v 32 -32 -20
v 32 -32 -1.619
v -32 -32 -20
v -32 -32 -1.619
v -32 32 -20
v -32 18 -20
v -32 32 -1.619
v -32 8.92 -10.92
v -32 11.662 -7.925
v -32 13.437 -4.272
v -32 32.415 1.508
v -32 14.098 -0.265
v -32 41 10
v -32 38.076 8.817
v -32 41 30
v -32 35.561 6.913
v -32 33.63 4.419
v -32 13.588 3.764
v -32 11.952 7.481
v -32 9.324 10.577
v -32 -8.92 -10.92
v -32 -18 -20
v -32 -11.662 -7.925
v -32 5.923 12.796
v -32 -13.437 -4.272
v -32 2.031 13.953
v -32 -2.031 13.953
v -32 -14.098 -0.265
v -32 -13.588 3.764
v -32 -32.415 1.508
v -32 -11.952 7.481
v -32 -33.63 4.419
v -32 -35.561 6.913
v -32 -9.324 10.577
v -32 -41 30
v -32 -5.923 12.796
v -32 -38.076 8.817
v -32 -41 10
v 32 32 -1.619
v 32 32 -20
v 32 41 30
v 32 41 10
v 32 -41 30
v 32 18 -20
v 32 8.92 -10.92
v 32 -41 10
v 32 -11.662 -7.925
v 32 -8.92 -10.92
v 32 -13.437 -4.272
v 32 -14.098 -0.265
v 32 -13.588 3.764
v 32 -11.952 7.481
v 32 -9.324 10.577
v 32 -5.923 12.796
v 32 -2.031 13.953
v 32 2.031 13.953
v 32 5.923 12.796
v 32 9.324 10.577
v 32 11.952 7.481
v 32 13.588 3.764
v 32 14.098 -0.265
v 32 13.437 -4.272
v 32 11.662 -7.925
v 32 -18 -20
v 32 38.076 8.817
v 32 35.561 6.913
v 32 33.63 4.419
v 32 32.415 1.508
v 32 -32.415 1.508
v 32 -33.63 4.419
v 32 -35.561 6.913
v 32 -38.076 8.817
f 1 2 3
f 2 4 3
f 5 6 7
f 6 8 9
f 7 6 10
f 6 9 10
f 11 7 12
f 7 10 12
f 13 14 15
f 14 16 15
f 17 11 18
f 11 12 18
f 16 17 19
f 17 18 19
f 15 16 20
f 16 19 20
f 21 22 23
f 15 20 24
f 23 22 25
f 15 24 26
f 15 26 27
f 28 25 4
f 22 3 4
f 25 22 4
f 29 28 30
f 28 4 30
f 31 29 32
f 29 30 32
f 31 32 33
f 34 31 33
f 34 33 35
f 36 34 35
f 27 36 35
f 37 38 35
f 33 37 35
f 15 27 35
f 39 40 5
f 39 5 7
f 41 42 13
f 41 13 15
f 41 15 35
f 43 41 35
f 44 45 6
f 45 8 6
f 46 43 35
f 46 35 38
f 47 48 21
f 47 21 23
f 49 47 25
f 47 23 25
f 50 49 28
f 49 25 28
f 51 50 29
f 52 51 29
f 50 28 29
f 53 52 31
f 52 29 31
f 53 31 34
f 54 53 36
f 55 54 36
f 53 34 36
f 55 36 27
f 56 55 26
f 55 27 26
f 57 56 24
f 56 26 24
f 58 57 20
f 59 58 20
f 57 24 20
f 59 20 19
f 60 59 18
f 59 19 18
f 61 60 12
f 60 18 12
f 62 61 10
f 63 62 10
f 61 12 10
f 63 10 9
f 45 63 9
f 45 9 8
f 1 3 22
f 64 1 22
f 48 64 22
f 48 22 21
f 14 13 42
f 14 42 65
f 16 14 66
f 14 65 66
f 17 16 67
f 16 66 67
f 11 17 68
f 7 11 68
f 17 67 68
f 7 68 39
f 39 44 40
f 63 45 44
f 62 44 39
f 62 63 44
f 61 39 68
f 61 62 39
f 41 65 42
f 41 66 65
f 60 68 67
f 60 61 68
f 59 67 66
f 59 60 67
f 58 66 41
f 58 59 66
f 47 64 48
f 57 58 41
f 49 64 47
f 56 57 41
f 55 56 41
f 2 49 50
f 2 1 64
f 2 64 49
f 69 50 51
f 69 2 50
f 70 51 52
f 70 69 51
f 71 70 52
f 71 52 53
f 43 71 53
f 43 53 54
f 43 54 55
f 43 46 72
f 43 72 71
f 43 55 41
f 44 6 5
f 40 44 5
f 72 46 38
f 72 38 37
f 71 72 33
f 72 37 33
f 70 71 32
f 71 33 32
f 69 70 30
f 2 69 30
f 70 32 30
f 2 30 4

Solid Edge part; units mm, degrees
sketch "Sketch1" plane through (0, 0, 0) normal (1, 0, 0) x (0, 1, 0)
  line L0 (41, 30) -> (-41, 30)
  line L1 (-41, 30) -> (-41, 10)
  line L2 (-41, 10) -> (-32, 10)
  line L3 (-32, 10) -> (-32, -20)
  line L4 (-32, -20) -> (-18, -20)
  line L5 (-18, -20) -> (-8.9199, -10.9199)
  arc A0 (-8.9199, -10.9199) -> (8.9199, -10.9199) centre (0, 0) cw
  line L6 (8.9199, -10.9199) -> (18, -20)
  line L7 (18, -20) -> (32, -20)
  line L8 (32, -20) -> (32, 10)
  line L9 (32, 10) -> (41, 10)
  line L10 (41, 10) -> (41, 30)
  dimension "D1" = 14.1
  dimension "D2" = 20
  dimension "D3" = 30
  dimension "D4" = 32
  dimension "D5" = 64
  dimension "D6" = 82
  dimension "D7" = 41
  dimension "D8" = 36
  dimension "D9" = 20
extrude "Protrusion1" add sketch "Sketch1" along normal mid plane 64
fillet "Round1" radius 12 2 edges at (0, -32, 10) (0, 32, 10)
